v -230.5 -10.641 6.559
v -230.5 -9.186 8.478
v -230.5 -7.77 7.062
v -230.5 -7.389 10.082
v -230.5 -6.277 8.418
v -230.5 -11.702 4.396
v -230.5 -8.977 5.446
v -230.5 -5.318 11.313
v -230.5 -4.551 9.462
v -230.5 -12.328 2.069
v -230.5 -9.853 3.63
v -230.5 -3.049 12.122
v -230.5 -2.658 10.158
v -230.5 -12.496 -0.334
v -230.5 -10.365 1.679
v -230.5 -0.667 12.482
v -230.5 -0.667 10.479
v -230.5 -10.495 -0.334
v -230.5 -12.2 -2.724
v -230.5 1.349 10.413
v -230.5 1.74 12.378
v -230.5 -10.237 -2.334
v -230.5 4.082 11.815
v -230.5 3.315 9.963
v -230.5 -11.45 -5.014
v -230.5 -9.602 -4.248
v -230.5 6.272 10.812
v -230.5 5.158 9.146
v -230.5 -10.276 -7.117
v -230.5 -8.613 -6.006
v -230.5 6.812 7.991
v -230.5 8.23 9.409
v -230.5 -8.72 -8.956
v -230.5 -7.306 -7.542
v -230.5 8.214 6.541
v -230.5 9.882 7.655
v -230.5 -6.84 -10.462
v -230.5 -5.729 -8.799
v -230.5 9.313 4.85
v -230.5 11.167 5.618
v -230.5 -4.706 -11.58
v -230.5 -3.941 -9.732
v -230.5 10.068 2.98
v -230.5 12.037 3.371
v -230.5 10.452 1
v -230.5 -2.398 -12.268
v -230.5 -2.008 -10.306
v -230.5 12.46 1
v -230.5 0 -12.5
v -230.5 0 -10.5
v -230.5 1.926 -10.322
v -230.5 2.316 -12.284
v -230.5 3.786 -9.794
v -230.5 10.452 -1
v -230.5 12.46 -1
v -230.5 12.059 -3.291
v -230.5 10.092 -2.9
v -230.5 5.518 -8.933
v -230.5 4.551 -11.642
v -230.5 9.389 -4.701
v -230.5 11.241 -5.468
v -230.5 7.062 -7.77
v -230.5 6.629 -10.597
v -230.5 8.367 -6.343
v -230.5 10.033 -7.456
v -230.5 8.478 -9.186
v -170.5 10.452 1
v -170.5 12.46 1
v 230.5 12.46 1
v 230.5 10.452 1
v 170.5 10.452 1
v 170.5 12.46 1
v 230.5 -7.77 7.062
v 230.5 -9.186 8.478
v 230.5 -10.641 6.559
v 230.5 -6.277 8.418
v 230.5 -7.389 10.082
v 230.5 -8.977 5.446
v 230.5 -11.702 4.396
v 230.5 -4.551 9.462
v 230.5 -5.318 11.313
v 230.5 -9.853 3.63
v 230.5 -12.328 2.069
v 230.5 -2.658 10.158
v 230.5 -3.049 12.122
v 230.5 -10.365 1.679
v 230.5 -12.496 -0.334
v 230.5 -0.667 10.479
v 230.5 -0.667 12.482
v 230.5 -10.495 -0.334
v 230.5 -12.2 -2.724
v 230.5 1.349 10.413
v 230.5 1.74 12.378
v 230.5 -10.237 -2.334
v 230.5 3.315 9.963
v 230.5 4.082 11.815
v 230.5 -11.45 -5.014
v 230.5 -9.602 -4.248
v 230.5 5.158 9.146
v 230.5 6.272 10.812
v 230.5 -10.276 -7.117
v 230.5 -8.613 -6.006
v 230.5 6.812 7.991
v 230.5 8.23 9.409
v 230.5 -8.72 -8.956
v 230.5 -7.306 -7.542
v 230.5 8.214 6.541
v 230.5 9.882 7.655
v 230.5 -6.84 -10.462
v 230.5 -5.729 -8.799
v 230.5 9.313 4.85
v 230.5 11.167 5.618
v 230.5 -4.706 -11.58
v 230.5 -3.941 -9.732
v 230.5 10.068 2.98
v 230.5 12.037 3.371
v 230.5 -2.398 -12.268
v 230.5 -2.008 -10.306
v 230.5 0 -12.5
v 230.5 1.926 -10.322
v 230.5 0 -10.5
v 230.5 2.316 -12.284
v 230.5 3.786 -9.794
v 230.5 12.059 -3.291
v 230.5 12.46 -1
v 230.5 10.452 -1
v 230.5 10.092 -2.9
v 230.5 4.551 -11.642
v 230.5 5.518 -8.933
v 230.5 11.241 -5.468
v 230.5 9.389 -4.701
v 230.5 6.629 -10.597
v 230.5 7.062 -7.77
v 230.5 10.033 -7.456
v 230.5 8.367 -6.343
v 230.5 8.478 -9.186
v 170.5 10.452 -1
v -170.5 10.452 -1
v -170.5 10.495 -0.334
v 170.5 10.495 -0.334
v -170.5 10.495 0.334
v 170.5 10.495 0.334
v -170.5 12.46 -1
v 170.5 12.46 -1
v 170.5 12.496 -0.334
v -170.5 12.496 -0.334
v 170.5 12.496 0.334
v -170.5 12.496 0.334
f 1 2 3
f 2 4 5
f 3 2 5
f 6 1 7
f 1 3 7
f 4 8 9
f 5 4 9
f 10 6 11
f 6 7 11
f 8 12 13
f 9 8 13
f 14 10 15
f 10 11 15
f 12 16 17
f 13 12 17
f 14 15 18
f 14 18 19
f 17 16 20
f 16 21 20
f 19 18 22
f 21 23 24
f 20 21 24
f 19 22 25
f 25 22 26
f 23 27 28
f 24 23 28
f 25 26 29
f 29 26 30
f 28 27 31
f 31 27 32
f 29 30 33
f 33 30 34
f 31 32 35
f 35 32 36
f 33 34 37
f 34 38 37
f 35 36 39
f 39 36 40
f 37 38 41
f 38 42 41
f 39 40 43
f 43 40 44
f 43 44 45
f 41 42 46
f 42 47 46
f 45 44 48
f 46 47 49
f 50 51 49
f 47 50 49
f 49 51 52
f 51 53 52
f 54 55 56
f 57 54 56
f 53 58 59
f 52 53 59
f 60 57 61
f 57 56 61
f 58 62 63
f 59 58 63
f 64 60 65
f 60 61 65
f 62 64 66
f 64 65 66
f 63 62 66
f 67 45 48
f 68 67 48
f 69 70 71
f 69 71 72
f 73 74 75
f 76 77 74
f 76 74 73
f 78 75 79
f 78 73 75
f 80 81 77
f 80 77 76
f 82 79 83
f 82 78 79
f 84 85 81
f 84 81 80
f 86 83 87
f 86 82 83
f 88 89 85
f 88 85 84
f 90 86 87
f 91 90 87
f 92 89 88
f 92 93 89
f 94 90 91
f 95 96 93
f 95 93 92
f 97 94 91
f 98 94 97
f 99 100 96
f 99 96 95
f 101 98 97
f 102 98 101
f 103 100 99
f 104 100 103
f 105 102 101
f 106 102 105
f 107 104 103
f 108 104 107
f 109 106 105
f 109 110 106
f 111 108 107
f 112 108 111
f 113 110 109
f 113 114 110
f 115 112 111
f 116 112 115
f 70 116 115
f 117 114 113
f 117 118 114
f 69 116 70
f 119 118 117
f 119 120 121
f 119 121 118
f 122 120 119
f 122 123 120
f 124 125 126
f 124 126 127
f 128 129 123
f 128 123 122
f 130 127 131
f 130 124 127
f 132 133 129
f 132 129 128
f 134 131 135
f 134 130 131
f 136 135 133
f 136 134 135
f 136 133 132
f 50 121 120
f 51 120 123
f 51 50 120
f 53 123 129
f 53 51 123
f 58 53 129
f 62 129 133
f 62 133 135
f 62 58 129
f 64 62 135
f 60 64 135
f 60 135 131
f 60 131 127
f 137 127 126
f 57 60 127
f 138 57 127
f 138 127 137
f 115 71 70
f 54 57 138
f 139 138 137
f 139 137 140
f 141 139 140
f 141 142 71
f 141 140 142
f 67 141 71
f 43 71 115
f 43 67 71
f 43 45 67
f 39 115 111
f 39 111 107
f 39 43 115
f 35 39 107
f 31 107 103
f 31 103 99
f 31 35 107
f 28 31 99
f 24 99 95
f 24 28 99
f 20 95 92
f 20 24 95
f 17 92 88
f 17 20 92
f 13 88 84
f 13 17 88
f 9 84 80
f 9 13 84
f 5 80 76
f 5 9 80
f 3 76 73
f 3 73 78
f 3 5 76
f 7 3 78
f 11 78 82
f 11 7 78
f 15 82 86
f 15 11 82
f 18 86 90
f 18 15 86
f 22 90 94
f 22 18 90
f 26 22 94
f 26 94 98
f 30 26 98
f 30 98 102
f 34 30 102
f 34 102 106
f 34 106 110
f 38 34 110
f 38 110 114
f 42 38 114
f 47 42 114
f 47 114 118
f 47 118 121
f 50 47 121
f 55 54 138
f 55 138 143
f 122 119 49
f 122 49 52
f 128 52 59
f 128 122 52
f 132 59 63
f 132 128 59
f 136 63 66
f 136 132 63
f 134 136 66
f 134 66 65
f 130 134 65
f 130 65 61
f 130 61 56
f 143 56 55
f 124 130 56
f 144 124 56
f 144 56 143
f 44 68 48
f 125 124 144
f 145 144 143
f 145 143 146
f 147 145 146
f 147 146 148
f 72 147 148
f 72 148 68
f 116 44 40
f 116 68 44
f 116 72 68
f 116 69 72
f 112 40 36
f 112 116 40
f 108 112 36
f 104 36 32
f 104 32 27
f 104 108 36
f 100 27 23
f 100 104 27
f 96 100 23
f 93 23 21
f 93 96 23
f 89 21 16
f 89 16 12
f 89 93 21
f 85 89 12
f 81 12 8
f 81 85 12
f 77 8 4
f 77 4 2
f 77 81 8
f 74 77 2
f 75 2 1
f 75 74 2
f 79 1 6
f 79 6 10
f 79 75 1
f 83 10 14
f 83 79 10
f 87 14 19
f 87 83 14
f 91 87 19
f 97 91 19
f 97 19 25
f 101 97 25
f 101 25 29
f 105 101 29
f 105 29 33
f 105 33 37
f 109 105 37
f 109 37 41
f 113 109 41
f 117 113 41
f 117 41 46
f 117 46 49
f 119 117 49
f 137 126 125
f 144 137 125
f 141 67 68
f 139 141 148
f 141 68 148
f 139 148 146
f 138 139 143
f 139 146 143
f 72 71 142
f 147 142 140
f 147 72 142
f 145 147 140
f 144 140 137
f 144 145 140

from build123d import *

# Parameters (mm, degrees)
ESBO_O2_R                = 12.5
ESBO_O2_R_2              = 10.5
RESSALTO_EXTRUS_O1_DEPTH = 230.5
ESBO_O3_W                = 2
ESBO_O3_H                = 5
CORTE_EXTRUS_O1_DEPTH    = 60


with BuildPart() as part:
    # Esboço2 → Ressalto-extrusão1 (new, symmetric)
    with BuildSketch(Plane(origin=(0, 0, 0), x_dir=(0, 0, -1), z_dir=(1, 0, 0))):
        Circle(ESBO_O2_R)
        Circle(ESBO_O2_R_2, mode=Mode.SUBTRACT)
    extrude(amount=RESSALTO_EXTRUS_O1_DEPTH, both=True)

    # Esboço3 → Corte-extrusão1 (cut)
    with BuildSketch(Plane(origin=(230.5, 0, 0), x_dir=(0, 0, -1), z_dir=(1, 0, 0))):
        with Locations((0, 12.5)):
            Rectangle(ESBO_O3_W, ESBO_O3_H)
    corte_extrus_o1 = extrude(amount=-CORTE_EXTRUS_O1_DEPTH, mode=Mode.SUBTRACT)

    # Espelhar1: Corte-extrusão1 across plane
    add(corte_extrus_o1.mirror(Plane(origin=(0, 0, 0), x_dir=(0, 0, 1), z_dir=(1, 0, 0))), mode=Mode.SUBTRACT)


solid = part.part
